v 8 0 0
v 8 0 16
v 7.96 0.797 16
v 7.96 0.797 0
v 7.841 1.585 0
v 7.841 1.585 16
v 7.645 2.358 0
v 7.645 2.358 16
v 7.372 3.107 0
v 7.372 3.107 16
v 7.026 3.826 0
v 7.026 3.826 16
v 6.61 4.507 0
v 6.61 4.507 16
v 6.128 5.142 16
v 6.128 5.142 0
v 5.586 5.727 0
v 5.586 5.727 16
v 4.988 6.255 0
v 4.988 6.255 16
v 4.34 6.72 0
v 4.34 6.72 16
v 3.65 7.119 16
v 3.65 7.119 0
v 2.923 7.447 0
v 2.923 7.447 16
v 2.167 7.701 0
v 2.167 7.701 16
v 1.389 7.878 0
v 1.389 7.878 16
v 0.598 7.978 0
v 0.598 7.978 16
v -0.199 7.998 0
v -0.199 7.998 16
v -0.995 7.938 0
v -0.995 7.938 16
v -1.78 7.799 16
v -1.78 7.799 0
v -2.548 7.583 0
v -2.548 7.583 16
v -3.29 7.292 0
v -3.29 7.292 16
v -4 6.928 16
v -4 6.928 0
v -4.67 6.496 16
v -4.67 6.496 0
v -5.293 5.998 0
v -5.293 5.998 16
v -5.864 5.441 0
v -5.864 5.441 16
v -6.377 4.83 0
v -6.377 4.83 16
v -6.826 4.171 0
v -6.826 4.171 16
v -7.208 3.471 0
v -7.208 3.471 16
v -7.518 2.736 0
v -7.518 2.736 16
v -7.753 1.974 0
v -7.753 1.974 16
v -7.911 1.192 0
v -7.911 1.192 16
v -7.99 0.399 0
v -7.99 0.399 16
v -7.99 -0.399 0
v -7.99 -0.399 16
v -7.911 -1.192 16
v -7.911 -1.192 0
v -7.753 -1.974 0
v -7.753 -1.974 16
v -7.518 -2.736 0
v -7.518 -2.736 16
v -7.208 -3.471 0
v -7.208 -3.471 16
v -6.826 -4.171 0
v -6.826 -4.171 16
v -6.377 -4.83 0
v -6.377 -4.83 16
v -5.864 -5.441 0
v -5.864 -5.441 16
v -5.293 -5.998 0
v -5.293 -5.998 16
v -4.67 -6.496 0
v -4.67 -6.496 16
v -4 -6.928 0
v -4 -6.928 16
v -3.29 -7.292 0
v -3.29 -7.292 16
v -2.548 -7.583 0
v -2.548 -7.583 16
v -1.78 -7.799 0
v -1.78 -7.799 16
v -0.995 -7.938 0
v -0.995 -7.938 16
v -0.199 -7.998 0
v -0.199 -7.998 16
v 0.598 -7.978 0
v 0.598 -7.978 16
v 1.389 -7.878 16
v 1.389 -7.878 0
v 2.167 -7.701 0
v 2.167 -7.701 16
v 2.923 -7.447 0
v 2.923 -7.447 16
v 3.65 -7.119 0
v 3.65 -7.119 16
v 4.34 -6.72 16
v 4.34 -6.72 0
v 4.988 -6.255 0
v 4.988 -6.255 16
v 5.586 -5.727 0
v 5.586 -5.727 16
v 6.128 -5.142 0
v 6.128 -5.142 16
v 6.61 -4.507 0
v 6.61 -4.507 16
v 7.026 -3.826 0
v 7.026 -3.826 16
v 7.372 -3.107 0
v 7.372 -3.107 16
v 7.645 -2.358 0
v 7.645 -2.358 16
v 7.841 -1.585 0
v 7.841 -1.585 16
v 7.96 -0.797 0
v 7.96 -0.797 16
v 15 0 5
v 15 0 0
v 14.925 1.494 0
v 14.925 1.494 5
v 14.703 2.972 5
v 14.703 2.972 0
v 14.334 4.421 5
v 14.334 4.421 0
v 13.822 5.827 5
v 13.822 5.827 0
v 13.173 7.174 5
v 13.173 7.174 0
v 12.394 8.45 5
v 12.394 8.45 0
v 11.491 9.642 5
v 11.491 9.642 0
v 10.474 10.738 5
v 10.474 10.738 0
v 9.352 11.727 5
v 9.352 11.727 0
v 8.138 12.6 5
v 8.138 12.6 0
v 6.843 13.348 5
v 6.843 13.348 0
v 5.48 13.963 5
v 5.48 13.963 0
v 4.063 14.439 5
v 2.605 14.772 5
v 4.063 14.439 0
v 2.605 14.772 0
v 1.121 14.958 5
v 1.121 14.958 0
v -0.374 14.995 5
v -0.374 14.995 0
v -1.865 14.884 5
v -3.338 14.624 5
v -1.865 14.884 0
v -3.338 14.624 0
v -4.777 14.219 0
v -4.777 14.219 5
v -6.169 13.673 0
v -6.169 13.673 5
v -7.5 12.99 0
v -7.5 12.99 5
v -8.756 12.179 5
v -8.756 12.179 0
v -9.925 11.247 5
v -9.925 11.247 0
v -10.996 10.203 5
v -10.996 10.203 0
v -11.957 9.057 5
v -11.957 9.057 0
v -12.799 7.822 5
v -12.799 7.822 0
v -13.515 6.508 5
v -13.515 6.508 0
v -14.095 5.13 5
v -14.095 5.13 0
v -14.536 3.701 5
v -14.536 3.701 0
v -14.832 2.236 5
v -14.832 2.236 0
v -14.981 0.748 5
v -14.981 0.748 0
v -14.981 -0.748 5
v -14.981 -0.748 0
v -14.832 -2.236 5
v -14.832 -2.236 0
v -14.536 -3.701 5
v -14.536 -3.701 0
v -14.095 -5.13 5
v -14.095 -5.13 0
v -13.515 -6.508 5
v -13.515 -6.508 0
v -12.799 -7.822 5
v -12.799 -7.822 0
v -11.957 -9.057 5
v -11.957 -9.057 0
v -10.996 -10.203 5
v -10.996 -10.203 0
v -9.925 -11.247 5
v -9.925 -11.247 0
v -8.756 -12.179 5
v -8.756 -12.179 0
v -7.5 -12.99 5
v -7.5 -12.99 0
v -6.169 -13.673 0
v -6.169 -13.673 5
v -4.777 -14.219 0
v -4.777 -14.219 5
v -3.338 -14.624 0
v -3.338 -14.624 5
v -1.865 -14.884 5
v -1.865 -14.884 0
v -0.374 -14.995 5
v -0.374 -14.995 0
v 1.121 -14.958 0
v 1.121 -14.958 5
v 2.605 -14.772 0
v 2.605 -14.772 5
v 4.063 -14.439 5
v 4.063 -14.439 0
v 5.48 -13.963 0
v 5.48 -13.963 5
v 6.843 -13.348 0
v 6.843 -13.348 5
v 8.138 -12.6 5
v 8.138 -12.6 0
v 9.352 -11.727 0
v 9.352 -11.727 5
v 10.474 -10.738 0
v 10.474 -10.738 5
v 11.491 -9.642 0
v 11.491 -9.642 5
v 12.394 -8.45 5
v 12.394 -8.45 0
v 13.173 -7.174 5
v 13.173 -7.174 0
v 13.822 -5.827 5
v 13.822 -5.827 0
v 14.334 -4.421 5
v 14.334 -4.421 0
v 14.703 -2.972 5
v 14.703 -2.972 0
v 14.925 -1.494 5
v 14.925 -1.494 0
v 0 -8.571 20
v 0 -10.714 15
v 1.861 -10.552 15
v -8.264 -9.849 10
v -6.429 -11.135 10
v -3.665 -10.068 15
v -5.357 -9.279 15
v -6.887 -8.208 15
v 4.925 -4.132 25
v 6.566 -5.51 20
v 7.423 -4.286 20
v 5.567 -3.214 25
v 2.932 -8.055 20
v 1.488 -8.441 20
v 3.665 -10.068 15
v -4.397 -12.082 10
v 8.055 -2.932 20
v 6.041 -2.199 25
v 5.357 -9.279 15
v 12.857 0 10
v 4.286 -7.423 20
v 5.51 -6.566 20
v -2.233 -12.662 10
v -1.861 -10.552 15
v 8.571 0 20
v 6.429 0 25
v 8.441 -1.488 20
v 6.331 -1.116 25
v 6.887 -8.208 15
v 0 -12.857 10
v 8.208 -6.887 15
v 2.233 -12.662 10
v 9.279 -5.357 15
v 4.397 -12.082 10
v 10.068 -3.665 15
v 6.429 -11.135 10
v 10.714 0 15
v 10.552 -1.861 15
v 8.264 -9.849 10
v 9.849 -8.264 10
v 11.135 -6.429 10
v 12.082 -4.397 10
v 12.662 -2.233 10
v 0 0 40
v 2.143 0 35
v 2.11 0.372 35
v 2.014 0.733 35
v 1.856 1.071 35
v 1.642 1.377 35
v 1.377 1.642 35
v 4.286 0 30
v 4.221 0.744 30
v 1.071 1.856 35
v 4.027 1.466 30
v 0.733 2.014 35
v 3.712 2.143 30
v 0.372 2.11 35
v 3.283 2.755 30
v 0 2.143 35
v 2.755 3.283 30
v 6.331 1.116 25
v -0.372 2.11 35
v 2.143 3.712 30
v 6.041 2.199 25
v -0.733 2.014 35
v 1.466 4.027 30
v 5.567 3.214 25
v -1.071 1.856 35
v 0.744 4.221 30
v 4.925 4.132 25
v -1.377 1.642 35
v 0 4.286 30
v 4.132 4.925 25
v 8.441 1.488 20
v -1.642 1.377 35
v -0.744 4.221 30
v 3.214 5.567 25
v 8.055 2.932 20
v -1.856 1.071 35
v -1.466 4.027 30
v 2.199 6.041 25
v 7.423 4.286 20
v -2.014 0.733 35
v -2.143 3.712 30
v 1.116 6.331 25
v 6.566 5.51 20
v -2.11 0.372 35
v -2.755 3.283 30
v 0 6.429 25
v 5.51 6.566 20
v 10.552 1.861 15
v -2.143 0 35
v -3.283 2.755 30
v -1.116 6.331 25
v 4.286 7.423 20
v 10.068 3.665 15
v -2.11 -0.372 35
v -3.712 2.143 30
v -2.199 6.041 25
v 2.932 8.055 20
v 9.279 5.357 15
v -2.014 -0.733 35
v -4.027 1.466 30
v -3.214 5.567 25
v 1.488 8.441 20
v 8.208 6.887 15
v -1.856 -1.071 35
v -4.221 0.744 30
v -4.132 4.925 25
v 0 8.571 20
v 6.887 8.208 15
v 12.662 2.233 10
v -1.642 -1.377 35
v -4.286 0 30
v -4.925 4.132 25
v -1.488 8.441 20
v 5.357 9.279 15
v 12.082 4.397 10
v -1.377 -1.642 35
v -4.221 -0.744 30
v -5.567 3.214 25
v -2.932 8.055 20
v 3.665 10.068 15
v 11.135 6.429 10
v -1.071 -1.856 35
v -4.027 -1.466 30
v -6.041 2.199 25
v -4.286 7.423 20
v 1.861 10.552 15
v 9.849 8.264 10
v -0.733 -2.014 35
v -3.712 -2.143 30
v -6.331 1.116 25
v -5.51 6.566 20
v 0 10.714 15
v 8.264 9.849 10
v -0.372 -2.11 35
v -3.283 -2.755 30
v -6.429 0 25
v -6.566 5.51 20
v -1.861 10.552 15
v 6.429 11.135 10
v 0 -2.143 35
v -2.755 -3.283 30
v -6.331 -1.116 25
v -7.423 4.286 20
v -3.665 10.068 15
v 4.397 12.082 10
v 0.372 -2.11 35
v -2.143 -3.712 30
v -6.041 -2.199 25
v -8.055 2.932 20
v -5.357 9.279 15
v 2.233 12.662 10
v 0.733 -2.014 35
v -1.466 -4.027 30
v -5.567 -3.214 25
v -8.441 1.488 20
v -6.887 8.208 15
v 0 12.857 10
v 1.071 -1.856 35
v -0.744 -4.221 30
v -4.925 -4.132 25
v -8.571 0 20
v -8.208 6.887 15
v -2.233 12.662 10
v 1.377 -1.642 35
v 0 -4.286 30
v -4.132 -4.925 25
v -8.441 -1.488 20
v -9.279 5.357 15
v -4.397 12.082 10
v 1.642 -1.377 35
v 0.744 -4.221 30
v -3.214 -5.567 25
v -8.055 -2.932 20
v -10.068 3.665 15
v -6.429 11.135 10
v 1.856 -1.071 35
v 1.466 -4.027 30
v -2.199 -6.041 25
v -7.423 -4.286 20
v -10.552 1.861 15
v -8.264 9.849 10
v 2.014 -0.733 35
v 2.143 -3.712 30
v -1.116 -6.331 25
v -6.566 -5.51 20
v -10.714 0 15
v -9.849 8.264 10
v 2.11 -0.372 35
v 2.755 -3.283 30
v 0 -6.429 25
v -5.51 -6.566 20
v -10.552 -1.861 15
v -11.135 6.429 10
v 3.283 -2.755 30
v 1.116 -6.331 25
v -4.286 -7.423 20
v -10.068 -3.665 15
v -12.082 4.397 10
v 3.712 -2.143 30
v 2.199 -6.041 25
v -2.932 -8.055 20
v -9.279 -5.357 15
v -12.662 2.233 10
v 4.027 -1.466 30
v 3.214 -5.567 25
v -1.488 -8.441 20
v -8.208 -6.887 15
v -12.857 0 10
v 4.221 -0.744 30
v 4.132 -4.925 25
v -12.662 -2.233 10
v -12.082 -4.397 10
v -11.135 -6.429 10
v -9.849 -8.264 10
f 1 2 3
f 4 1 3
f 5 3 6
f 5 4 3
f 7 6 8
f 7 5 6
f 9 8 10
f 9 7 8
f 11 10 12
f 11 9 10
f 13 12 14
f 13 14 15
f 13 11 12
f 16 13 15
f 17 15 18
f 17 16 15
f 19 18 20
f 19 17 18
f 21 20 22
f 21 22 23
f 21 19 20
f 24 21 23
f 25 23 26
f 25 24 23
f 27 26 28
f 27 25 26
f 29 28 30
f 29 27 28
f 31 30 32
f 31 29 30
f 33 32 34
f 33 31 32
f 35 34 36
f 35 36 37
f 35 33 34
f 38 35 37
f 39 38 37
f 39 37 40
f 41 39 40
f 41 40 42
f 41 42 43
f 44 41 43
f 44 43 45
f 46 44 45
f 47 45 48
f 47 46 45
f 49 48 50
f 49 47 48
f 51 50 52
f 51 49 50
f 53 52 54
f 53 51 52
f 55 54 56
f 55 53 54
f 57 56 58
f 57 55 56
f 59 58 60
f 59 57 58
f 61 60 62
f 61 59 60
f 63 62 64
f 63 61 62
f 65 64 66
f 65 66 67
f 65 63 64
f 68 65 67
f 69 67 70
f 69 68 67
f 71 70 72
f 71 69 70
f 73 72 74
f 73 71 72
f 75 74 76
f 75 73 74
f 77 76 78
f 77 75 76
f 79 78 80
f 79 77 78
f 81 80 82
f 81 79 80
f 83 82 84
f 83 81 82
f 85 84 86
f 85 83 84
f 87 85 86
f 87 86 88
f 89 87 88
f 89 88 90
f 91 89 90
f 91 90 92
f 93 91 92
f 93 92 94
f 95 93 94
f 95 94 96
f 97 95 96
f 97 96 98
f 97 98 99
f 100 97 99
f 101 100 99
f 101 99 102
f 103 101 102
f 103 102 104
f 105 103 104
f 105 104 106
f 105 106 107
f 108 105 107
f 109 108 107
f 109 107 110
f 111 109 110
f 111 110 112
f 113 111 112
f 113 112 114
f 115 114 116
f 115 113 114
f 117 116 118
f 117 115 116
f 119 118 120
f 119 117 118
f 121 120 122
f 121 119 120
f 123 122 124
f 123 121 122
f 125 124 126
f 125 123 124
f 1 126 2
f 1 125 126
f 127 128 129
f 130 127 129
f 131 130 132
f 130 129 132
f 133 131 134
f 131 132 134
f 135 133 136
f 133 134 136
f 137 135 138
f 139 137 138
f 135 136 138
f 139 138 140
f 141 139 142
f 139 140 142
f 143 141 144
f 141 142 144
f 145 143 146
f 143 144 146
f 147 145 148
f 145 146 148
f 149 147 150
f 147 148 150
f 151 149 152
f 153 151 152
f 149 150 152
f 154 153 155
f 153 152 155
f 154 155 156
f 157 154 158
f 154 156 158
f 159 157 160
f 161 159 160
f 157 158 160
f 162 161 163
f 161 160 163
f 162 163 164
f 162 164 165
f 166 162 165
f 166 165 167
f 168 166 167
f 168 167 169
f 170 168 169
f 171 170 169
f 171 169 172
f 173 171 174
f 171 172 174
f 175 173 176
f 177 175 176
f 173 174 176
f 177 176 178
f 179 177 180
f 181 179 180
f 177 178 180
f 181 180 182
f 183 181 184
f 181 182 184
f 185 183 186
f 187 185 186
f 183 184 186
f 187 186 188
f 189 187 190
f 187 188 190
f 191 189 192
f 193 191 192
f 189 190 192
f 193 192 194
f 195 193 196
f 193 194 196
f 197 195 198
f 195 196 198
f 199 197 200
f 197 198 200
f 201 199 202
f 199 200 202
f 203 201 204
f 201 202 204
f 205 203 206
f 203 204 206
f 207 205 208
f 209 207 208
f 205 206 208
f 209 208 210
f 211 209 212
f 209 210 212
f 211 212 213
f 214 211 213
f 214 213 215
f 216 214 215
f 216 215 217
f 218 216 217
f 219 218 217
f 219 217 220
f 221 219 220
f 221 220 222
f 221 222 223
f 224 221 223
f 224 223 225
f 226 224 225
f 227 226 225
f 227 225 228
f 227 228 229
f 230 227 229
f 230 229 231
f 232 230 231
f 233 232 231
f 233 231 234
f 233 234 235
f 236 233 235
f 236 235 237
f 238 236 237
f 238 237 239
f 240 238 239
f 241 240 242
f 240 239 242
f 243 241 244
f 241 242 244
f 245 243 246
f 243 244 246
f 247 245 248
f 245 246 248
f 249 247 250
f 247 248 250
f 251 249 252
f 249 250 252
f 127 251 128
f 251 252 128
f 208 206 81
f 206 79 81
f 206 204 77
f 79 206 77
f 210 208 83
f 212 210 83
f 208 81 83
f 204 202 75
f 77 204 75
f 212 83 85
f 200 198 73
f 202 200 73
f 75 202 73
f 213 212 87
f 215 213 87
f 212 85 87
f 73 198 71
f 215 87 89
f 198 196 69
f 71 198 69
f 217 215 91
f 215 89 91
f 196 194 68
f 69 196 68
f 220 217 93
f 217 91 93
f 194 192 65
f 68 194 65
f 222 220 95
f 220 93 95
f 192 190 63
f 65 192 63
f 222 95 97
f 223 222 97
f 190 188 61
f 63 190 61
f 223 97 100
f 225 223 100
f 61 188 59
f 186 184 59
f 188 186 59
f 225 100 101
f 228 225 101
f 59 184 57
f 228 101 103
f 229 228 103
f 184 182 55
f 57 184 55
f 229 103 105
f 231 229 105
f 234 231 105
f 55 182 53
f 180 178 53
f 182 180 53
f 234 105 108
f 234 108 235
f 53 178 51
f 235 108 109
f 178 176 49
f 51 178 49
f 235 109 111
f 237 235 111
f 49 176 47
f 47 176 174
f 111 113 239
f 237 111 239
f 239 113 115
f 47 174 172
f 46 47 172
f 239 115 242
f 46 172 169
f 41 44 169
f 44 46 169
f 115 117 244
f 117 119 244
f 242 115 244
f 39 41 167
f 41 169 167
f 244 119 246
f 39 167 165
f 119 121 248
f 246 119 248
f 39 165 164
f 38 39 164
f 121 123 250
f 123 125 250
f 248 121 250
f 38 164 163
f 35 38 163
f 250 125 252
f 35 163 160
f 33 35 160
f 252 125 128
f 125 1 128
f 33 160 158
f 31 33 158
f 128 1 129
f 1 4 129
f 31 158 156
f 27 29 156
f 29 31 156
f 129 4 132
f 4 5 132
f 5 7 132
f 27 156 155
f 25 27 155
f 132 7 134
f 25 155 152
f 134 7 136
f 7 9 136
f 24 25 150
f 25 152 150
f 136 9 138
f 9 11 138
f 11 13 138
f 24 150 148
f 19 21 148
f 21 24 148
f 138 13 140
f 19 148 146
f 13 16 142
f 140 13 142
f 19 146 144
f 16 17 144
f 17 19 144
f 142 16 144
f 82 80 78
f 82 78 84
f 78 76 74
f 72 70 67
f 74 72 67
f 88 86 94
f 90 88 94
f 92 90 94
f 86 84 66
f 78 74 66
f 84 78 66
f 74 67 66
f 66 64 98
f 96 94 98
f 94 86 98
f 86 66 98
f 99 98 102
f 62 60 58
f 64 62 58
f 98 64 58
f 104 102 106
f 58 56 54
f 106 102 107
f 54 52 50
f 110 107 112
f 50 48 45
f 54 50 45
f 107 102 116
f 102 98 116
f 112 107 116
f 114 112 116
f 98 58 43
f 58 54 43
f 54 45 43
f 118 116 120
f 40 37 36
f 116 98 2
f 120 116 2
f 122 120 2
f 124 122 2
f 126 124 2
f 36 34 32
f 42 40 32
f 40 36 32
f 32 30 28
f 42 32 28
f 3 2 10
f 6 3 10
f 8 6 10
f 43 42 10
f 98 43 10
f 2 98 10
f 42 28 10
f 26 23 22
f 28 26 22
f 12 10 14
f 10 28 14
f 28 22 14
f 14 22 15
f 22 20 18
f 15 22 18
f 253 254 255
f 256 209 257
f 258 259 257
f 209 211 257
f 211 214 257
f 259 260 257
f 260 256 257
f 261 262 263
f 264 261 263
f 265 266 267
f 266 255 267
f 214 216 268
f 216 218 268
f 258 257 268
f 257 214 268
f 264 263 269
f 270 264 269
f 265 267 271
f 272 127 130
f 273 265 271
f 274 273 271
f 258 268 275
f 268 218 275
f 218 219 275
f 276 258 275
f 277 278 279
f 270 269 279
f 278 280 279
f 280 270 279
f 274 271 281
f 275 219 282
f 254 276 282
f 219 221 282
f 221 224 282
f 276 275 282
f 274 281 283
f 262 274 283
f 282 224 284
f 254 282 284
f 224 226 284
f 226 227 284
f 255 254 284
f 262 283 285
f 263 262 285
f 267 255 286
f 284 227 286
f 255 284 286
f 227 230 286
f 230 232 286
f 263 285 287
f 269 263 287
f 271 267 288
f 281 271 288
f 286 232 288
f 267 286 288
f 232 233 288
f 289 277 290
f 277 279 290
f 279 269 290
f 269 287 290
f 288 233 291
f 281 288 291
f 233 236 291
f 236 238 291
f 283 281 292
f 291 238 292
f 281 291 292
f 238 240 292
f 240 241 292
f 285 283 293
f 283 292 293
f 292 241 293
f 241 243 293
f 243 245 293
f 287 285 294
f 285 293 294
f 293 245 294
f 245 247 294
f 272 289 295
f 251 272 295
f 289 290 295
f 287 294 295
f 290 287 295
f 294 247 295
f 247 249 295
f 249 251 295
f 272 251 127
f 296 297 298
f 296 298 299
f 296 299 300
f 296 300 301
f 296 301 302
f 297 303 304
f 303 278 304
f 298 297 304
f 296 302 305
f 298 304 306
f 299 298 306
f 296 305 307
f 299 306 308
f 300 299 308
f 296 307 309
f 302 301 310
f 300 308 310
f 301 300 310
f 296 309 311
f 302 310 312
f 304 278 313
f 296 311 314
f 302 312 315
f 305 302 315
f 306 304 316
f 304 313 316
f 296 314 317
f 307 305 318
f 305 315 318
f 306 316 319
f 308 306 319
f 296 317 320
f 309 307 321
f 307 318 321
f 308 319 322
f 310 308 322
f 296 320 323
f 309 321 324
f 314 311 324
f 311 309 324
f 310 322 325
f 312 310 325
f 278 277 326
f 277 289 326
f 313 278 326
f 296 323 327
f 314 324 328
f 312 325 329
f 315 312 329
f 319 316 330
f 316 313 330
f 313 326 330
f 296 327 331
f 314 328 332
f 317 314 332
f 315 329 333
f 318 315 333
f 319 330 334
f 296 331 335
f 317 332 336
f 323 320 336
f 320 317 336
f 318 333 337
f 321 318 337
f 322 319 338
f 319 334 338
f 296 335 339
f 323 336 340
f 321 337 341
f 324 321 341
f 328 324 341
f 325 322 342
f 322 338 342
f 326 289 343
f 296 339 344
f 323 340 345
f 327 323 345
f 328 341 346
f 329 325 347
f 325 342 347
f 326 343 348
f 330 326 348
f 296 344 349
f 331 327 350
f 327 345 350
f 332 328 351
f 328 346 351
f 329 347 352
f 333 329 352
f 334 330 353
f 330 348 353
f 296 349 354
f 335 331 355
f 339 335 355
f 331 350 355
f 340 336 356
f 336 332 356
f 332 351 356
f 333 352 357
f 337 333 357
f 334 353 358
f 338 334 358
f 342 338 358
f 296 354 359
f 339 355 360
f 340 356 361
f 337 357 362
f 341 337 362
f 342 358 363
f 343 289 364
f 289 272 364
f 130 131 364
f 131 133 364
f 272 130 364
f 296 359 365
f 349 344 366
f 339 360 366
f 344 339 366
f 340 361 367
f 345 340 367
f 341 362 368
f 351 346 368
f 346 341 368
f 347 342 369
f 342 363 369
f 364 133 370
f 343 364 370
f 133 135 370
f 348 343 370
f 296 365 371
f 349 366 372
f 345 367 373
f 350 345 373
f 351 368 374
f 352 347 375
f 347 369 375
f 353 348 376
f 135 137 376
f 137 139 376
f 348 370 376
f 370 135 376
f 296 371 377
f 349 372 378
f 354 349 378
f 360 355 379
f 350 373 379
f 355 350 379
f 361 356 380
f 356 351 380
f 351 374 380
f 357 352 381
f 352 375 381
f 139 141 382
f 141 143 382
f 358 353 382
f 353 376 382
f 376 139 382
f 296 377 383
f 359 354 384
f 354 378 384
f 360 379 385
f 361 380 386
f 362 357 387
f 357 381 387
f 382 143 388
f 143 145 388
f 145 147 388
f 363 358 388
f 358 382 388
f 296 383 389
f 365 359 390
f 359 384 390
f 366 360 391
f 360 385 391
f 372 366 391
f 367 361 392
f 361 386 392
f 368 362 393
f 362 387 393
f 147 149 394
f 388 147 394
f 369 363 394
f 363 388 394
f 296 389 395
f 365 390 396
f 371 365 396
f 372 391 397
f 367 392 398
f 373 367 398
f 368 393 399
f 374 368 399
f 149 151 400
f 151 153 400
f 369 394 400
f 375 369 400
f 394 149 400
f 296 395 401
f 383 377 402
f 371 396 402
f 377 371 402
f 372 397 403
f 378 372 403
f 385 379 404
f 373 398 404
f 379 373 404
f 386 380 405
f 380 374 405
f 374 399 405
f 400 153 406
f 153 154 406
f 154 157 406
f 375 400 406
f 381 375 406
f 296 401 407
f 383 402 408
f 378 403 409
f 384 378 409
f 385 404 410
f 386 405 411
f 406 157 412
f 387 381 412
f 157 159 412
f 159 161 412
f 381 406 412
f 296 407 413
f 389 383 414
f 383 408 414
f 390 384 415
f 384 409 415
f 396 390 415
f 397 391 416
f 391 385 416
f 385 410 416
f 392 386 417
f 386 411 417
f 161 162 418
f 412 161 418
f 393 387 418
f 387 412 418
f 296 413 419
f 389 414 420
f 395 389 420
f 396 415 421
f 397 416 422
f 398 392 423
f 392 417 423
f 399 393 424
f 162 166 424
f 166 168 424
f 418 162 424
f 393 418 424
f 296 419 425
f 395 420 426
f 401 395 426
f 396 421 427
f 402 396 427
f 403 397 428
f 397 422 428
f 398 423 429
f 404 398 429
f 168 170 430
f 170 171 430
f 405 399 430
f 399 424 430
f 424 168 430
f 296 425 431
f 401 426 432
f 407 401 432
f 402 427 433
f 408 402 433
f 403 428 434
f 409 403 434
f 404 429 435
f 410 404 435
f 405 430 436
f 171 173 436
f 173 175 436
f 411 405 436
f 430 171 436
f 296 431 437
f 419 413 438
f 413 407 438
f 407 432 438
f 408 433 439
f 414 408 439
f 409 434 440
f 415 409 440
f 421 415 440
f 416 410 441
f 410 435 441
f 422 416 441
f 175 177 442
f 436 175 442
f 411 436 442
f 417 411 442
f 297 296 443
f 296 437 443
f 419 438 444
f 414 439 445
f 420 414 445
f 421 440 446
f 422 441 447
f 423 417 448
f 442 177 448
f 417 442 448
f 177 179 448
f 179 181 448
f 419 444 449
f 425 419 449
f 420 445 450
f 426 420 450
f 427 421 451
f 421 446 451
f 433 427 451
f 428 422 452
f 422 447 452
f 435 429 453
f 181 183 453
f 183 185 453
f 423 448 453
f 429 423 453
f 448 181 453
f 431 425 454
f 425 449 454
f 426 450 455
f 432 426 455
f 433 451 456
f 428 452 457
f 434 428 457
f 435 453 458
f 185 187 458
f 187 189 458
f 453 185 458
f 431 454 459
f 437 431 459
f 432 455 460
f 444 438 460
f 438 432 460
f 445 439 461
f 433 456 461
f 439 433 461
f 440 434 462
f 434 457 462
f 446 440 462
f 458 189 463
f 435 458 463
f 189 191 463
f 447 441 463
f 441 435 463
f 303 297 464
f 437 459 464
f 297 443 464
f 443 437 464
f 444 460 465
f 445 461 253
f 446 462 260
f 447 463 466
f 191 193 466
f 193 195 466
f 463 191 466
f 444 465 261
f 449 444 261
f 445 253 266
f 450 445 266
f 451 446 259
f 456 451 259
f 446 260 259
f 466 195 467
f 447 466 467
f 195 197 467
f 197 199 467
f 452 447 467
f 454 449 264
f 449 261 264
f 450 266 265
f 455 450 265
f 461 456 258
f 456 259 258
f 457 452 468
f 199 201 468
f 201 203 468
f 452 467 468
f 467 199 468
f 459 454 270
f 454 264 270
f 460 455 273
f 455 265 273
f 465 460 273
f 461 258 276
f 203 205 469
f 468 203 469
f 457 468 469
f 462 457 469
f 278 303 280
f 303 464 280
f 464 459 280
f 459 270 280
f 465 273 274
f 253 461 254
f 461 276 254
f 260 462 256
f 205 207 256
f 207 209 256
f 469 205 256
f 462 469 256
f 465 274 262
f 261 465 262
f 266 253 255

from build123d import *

# Parameters (mm, degrees)
F0_R     = 15
F0_R_2   = 8
F0_R_3   = 1.5
F1_DEPTH = 40
F2_DEPTH = 16
F3_SIZE2 = 35
F3_SIZE  = 15


with BuildPart() as f1:
    # F0 (on Top) → F1 (new body)
    with BuildSketch(Plane.XY):
        Circle(F0_R)
        Circle(F0_R_2, mode=Mode.SUBTRACT)
        Circle(F0_R_2)
        Circle(F0_R_3, mode=Mode.SUBTRACT)
        Circle(F0_R_3)
    extrude(amount=F1_DEPTH)

    # F0 (on Top) → F2 (cut)
    with BuildSketch(Plane.XY):
        Circle(F0_R_2)
        Circle(F0_R_3, mode=Mode.SUBTRACT)
        Circle(F0_R_3)
    extrude(amount=F2_DEPTH, mode=Mode.SUBTRACT)

    # F3
    f3_edges = [f1.edges().sort_by_distance(p)[0] for p in [
        (-15, 0, 40),
    ]]
    f3_side = f1.faces().sort_by_distance((0, 0, 40))[0]
    chamfer(f3_edges, length=F3_SIZE, length2=F3_SIZE2, reference=f3_side)


solid = f1.part
